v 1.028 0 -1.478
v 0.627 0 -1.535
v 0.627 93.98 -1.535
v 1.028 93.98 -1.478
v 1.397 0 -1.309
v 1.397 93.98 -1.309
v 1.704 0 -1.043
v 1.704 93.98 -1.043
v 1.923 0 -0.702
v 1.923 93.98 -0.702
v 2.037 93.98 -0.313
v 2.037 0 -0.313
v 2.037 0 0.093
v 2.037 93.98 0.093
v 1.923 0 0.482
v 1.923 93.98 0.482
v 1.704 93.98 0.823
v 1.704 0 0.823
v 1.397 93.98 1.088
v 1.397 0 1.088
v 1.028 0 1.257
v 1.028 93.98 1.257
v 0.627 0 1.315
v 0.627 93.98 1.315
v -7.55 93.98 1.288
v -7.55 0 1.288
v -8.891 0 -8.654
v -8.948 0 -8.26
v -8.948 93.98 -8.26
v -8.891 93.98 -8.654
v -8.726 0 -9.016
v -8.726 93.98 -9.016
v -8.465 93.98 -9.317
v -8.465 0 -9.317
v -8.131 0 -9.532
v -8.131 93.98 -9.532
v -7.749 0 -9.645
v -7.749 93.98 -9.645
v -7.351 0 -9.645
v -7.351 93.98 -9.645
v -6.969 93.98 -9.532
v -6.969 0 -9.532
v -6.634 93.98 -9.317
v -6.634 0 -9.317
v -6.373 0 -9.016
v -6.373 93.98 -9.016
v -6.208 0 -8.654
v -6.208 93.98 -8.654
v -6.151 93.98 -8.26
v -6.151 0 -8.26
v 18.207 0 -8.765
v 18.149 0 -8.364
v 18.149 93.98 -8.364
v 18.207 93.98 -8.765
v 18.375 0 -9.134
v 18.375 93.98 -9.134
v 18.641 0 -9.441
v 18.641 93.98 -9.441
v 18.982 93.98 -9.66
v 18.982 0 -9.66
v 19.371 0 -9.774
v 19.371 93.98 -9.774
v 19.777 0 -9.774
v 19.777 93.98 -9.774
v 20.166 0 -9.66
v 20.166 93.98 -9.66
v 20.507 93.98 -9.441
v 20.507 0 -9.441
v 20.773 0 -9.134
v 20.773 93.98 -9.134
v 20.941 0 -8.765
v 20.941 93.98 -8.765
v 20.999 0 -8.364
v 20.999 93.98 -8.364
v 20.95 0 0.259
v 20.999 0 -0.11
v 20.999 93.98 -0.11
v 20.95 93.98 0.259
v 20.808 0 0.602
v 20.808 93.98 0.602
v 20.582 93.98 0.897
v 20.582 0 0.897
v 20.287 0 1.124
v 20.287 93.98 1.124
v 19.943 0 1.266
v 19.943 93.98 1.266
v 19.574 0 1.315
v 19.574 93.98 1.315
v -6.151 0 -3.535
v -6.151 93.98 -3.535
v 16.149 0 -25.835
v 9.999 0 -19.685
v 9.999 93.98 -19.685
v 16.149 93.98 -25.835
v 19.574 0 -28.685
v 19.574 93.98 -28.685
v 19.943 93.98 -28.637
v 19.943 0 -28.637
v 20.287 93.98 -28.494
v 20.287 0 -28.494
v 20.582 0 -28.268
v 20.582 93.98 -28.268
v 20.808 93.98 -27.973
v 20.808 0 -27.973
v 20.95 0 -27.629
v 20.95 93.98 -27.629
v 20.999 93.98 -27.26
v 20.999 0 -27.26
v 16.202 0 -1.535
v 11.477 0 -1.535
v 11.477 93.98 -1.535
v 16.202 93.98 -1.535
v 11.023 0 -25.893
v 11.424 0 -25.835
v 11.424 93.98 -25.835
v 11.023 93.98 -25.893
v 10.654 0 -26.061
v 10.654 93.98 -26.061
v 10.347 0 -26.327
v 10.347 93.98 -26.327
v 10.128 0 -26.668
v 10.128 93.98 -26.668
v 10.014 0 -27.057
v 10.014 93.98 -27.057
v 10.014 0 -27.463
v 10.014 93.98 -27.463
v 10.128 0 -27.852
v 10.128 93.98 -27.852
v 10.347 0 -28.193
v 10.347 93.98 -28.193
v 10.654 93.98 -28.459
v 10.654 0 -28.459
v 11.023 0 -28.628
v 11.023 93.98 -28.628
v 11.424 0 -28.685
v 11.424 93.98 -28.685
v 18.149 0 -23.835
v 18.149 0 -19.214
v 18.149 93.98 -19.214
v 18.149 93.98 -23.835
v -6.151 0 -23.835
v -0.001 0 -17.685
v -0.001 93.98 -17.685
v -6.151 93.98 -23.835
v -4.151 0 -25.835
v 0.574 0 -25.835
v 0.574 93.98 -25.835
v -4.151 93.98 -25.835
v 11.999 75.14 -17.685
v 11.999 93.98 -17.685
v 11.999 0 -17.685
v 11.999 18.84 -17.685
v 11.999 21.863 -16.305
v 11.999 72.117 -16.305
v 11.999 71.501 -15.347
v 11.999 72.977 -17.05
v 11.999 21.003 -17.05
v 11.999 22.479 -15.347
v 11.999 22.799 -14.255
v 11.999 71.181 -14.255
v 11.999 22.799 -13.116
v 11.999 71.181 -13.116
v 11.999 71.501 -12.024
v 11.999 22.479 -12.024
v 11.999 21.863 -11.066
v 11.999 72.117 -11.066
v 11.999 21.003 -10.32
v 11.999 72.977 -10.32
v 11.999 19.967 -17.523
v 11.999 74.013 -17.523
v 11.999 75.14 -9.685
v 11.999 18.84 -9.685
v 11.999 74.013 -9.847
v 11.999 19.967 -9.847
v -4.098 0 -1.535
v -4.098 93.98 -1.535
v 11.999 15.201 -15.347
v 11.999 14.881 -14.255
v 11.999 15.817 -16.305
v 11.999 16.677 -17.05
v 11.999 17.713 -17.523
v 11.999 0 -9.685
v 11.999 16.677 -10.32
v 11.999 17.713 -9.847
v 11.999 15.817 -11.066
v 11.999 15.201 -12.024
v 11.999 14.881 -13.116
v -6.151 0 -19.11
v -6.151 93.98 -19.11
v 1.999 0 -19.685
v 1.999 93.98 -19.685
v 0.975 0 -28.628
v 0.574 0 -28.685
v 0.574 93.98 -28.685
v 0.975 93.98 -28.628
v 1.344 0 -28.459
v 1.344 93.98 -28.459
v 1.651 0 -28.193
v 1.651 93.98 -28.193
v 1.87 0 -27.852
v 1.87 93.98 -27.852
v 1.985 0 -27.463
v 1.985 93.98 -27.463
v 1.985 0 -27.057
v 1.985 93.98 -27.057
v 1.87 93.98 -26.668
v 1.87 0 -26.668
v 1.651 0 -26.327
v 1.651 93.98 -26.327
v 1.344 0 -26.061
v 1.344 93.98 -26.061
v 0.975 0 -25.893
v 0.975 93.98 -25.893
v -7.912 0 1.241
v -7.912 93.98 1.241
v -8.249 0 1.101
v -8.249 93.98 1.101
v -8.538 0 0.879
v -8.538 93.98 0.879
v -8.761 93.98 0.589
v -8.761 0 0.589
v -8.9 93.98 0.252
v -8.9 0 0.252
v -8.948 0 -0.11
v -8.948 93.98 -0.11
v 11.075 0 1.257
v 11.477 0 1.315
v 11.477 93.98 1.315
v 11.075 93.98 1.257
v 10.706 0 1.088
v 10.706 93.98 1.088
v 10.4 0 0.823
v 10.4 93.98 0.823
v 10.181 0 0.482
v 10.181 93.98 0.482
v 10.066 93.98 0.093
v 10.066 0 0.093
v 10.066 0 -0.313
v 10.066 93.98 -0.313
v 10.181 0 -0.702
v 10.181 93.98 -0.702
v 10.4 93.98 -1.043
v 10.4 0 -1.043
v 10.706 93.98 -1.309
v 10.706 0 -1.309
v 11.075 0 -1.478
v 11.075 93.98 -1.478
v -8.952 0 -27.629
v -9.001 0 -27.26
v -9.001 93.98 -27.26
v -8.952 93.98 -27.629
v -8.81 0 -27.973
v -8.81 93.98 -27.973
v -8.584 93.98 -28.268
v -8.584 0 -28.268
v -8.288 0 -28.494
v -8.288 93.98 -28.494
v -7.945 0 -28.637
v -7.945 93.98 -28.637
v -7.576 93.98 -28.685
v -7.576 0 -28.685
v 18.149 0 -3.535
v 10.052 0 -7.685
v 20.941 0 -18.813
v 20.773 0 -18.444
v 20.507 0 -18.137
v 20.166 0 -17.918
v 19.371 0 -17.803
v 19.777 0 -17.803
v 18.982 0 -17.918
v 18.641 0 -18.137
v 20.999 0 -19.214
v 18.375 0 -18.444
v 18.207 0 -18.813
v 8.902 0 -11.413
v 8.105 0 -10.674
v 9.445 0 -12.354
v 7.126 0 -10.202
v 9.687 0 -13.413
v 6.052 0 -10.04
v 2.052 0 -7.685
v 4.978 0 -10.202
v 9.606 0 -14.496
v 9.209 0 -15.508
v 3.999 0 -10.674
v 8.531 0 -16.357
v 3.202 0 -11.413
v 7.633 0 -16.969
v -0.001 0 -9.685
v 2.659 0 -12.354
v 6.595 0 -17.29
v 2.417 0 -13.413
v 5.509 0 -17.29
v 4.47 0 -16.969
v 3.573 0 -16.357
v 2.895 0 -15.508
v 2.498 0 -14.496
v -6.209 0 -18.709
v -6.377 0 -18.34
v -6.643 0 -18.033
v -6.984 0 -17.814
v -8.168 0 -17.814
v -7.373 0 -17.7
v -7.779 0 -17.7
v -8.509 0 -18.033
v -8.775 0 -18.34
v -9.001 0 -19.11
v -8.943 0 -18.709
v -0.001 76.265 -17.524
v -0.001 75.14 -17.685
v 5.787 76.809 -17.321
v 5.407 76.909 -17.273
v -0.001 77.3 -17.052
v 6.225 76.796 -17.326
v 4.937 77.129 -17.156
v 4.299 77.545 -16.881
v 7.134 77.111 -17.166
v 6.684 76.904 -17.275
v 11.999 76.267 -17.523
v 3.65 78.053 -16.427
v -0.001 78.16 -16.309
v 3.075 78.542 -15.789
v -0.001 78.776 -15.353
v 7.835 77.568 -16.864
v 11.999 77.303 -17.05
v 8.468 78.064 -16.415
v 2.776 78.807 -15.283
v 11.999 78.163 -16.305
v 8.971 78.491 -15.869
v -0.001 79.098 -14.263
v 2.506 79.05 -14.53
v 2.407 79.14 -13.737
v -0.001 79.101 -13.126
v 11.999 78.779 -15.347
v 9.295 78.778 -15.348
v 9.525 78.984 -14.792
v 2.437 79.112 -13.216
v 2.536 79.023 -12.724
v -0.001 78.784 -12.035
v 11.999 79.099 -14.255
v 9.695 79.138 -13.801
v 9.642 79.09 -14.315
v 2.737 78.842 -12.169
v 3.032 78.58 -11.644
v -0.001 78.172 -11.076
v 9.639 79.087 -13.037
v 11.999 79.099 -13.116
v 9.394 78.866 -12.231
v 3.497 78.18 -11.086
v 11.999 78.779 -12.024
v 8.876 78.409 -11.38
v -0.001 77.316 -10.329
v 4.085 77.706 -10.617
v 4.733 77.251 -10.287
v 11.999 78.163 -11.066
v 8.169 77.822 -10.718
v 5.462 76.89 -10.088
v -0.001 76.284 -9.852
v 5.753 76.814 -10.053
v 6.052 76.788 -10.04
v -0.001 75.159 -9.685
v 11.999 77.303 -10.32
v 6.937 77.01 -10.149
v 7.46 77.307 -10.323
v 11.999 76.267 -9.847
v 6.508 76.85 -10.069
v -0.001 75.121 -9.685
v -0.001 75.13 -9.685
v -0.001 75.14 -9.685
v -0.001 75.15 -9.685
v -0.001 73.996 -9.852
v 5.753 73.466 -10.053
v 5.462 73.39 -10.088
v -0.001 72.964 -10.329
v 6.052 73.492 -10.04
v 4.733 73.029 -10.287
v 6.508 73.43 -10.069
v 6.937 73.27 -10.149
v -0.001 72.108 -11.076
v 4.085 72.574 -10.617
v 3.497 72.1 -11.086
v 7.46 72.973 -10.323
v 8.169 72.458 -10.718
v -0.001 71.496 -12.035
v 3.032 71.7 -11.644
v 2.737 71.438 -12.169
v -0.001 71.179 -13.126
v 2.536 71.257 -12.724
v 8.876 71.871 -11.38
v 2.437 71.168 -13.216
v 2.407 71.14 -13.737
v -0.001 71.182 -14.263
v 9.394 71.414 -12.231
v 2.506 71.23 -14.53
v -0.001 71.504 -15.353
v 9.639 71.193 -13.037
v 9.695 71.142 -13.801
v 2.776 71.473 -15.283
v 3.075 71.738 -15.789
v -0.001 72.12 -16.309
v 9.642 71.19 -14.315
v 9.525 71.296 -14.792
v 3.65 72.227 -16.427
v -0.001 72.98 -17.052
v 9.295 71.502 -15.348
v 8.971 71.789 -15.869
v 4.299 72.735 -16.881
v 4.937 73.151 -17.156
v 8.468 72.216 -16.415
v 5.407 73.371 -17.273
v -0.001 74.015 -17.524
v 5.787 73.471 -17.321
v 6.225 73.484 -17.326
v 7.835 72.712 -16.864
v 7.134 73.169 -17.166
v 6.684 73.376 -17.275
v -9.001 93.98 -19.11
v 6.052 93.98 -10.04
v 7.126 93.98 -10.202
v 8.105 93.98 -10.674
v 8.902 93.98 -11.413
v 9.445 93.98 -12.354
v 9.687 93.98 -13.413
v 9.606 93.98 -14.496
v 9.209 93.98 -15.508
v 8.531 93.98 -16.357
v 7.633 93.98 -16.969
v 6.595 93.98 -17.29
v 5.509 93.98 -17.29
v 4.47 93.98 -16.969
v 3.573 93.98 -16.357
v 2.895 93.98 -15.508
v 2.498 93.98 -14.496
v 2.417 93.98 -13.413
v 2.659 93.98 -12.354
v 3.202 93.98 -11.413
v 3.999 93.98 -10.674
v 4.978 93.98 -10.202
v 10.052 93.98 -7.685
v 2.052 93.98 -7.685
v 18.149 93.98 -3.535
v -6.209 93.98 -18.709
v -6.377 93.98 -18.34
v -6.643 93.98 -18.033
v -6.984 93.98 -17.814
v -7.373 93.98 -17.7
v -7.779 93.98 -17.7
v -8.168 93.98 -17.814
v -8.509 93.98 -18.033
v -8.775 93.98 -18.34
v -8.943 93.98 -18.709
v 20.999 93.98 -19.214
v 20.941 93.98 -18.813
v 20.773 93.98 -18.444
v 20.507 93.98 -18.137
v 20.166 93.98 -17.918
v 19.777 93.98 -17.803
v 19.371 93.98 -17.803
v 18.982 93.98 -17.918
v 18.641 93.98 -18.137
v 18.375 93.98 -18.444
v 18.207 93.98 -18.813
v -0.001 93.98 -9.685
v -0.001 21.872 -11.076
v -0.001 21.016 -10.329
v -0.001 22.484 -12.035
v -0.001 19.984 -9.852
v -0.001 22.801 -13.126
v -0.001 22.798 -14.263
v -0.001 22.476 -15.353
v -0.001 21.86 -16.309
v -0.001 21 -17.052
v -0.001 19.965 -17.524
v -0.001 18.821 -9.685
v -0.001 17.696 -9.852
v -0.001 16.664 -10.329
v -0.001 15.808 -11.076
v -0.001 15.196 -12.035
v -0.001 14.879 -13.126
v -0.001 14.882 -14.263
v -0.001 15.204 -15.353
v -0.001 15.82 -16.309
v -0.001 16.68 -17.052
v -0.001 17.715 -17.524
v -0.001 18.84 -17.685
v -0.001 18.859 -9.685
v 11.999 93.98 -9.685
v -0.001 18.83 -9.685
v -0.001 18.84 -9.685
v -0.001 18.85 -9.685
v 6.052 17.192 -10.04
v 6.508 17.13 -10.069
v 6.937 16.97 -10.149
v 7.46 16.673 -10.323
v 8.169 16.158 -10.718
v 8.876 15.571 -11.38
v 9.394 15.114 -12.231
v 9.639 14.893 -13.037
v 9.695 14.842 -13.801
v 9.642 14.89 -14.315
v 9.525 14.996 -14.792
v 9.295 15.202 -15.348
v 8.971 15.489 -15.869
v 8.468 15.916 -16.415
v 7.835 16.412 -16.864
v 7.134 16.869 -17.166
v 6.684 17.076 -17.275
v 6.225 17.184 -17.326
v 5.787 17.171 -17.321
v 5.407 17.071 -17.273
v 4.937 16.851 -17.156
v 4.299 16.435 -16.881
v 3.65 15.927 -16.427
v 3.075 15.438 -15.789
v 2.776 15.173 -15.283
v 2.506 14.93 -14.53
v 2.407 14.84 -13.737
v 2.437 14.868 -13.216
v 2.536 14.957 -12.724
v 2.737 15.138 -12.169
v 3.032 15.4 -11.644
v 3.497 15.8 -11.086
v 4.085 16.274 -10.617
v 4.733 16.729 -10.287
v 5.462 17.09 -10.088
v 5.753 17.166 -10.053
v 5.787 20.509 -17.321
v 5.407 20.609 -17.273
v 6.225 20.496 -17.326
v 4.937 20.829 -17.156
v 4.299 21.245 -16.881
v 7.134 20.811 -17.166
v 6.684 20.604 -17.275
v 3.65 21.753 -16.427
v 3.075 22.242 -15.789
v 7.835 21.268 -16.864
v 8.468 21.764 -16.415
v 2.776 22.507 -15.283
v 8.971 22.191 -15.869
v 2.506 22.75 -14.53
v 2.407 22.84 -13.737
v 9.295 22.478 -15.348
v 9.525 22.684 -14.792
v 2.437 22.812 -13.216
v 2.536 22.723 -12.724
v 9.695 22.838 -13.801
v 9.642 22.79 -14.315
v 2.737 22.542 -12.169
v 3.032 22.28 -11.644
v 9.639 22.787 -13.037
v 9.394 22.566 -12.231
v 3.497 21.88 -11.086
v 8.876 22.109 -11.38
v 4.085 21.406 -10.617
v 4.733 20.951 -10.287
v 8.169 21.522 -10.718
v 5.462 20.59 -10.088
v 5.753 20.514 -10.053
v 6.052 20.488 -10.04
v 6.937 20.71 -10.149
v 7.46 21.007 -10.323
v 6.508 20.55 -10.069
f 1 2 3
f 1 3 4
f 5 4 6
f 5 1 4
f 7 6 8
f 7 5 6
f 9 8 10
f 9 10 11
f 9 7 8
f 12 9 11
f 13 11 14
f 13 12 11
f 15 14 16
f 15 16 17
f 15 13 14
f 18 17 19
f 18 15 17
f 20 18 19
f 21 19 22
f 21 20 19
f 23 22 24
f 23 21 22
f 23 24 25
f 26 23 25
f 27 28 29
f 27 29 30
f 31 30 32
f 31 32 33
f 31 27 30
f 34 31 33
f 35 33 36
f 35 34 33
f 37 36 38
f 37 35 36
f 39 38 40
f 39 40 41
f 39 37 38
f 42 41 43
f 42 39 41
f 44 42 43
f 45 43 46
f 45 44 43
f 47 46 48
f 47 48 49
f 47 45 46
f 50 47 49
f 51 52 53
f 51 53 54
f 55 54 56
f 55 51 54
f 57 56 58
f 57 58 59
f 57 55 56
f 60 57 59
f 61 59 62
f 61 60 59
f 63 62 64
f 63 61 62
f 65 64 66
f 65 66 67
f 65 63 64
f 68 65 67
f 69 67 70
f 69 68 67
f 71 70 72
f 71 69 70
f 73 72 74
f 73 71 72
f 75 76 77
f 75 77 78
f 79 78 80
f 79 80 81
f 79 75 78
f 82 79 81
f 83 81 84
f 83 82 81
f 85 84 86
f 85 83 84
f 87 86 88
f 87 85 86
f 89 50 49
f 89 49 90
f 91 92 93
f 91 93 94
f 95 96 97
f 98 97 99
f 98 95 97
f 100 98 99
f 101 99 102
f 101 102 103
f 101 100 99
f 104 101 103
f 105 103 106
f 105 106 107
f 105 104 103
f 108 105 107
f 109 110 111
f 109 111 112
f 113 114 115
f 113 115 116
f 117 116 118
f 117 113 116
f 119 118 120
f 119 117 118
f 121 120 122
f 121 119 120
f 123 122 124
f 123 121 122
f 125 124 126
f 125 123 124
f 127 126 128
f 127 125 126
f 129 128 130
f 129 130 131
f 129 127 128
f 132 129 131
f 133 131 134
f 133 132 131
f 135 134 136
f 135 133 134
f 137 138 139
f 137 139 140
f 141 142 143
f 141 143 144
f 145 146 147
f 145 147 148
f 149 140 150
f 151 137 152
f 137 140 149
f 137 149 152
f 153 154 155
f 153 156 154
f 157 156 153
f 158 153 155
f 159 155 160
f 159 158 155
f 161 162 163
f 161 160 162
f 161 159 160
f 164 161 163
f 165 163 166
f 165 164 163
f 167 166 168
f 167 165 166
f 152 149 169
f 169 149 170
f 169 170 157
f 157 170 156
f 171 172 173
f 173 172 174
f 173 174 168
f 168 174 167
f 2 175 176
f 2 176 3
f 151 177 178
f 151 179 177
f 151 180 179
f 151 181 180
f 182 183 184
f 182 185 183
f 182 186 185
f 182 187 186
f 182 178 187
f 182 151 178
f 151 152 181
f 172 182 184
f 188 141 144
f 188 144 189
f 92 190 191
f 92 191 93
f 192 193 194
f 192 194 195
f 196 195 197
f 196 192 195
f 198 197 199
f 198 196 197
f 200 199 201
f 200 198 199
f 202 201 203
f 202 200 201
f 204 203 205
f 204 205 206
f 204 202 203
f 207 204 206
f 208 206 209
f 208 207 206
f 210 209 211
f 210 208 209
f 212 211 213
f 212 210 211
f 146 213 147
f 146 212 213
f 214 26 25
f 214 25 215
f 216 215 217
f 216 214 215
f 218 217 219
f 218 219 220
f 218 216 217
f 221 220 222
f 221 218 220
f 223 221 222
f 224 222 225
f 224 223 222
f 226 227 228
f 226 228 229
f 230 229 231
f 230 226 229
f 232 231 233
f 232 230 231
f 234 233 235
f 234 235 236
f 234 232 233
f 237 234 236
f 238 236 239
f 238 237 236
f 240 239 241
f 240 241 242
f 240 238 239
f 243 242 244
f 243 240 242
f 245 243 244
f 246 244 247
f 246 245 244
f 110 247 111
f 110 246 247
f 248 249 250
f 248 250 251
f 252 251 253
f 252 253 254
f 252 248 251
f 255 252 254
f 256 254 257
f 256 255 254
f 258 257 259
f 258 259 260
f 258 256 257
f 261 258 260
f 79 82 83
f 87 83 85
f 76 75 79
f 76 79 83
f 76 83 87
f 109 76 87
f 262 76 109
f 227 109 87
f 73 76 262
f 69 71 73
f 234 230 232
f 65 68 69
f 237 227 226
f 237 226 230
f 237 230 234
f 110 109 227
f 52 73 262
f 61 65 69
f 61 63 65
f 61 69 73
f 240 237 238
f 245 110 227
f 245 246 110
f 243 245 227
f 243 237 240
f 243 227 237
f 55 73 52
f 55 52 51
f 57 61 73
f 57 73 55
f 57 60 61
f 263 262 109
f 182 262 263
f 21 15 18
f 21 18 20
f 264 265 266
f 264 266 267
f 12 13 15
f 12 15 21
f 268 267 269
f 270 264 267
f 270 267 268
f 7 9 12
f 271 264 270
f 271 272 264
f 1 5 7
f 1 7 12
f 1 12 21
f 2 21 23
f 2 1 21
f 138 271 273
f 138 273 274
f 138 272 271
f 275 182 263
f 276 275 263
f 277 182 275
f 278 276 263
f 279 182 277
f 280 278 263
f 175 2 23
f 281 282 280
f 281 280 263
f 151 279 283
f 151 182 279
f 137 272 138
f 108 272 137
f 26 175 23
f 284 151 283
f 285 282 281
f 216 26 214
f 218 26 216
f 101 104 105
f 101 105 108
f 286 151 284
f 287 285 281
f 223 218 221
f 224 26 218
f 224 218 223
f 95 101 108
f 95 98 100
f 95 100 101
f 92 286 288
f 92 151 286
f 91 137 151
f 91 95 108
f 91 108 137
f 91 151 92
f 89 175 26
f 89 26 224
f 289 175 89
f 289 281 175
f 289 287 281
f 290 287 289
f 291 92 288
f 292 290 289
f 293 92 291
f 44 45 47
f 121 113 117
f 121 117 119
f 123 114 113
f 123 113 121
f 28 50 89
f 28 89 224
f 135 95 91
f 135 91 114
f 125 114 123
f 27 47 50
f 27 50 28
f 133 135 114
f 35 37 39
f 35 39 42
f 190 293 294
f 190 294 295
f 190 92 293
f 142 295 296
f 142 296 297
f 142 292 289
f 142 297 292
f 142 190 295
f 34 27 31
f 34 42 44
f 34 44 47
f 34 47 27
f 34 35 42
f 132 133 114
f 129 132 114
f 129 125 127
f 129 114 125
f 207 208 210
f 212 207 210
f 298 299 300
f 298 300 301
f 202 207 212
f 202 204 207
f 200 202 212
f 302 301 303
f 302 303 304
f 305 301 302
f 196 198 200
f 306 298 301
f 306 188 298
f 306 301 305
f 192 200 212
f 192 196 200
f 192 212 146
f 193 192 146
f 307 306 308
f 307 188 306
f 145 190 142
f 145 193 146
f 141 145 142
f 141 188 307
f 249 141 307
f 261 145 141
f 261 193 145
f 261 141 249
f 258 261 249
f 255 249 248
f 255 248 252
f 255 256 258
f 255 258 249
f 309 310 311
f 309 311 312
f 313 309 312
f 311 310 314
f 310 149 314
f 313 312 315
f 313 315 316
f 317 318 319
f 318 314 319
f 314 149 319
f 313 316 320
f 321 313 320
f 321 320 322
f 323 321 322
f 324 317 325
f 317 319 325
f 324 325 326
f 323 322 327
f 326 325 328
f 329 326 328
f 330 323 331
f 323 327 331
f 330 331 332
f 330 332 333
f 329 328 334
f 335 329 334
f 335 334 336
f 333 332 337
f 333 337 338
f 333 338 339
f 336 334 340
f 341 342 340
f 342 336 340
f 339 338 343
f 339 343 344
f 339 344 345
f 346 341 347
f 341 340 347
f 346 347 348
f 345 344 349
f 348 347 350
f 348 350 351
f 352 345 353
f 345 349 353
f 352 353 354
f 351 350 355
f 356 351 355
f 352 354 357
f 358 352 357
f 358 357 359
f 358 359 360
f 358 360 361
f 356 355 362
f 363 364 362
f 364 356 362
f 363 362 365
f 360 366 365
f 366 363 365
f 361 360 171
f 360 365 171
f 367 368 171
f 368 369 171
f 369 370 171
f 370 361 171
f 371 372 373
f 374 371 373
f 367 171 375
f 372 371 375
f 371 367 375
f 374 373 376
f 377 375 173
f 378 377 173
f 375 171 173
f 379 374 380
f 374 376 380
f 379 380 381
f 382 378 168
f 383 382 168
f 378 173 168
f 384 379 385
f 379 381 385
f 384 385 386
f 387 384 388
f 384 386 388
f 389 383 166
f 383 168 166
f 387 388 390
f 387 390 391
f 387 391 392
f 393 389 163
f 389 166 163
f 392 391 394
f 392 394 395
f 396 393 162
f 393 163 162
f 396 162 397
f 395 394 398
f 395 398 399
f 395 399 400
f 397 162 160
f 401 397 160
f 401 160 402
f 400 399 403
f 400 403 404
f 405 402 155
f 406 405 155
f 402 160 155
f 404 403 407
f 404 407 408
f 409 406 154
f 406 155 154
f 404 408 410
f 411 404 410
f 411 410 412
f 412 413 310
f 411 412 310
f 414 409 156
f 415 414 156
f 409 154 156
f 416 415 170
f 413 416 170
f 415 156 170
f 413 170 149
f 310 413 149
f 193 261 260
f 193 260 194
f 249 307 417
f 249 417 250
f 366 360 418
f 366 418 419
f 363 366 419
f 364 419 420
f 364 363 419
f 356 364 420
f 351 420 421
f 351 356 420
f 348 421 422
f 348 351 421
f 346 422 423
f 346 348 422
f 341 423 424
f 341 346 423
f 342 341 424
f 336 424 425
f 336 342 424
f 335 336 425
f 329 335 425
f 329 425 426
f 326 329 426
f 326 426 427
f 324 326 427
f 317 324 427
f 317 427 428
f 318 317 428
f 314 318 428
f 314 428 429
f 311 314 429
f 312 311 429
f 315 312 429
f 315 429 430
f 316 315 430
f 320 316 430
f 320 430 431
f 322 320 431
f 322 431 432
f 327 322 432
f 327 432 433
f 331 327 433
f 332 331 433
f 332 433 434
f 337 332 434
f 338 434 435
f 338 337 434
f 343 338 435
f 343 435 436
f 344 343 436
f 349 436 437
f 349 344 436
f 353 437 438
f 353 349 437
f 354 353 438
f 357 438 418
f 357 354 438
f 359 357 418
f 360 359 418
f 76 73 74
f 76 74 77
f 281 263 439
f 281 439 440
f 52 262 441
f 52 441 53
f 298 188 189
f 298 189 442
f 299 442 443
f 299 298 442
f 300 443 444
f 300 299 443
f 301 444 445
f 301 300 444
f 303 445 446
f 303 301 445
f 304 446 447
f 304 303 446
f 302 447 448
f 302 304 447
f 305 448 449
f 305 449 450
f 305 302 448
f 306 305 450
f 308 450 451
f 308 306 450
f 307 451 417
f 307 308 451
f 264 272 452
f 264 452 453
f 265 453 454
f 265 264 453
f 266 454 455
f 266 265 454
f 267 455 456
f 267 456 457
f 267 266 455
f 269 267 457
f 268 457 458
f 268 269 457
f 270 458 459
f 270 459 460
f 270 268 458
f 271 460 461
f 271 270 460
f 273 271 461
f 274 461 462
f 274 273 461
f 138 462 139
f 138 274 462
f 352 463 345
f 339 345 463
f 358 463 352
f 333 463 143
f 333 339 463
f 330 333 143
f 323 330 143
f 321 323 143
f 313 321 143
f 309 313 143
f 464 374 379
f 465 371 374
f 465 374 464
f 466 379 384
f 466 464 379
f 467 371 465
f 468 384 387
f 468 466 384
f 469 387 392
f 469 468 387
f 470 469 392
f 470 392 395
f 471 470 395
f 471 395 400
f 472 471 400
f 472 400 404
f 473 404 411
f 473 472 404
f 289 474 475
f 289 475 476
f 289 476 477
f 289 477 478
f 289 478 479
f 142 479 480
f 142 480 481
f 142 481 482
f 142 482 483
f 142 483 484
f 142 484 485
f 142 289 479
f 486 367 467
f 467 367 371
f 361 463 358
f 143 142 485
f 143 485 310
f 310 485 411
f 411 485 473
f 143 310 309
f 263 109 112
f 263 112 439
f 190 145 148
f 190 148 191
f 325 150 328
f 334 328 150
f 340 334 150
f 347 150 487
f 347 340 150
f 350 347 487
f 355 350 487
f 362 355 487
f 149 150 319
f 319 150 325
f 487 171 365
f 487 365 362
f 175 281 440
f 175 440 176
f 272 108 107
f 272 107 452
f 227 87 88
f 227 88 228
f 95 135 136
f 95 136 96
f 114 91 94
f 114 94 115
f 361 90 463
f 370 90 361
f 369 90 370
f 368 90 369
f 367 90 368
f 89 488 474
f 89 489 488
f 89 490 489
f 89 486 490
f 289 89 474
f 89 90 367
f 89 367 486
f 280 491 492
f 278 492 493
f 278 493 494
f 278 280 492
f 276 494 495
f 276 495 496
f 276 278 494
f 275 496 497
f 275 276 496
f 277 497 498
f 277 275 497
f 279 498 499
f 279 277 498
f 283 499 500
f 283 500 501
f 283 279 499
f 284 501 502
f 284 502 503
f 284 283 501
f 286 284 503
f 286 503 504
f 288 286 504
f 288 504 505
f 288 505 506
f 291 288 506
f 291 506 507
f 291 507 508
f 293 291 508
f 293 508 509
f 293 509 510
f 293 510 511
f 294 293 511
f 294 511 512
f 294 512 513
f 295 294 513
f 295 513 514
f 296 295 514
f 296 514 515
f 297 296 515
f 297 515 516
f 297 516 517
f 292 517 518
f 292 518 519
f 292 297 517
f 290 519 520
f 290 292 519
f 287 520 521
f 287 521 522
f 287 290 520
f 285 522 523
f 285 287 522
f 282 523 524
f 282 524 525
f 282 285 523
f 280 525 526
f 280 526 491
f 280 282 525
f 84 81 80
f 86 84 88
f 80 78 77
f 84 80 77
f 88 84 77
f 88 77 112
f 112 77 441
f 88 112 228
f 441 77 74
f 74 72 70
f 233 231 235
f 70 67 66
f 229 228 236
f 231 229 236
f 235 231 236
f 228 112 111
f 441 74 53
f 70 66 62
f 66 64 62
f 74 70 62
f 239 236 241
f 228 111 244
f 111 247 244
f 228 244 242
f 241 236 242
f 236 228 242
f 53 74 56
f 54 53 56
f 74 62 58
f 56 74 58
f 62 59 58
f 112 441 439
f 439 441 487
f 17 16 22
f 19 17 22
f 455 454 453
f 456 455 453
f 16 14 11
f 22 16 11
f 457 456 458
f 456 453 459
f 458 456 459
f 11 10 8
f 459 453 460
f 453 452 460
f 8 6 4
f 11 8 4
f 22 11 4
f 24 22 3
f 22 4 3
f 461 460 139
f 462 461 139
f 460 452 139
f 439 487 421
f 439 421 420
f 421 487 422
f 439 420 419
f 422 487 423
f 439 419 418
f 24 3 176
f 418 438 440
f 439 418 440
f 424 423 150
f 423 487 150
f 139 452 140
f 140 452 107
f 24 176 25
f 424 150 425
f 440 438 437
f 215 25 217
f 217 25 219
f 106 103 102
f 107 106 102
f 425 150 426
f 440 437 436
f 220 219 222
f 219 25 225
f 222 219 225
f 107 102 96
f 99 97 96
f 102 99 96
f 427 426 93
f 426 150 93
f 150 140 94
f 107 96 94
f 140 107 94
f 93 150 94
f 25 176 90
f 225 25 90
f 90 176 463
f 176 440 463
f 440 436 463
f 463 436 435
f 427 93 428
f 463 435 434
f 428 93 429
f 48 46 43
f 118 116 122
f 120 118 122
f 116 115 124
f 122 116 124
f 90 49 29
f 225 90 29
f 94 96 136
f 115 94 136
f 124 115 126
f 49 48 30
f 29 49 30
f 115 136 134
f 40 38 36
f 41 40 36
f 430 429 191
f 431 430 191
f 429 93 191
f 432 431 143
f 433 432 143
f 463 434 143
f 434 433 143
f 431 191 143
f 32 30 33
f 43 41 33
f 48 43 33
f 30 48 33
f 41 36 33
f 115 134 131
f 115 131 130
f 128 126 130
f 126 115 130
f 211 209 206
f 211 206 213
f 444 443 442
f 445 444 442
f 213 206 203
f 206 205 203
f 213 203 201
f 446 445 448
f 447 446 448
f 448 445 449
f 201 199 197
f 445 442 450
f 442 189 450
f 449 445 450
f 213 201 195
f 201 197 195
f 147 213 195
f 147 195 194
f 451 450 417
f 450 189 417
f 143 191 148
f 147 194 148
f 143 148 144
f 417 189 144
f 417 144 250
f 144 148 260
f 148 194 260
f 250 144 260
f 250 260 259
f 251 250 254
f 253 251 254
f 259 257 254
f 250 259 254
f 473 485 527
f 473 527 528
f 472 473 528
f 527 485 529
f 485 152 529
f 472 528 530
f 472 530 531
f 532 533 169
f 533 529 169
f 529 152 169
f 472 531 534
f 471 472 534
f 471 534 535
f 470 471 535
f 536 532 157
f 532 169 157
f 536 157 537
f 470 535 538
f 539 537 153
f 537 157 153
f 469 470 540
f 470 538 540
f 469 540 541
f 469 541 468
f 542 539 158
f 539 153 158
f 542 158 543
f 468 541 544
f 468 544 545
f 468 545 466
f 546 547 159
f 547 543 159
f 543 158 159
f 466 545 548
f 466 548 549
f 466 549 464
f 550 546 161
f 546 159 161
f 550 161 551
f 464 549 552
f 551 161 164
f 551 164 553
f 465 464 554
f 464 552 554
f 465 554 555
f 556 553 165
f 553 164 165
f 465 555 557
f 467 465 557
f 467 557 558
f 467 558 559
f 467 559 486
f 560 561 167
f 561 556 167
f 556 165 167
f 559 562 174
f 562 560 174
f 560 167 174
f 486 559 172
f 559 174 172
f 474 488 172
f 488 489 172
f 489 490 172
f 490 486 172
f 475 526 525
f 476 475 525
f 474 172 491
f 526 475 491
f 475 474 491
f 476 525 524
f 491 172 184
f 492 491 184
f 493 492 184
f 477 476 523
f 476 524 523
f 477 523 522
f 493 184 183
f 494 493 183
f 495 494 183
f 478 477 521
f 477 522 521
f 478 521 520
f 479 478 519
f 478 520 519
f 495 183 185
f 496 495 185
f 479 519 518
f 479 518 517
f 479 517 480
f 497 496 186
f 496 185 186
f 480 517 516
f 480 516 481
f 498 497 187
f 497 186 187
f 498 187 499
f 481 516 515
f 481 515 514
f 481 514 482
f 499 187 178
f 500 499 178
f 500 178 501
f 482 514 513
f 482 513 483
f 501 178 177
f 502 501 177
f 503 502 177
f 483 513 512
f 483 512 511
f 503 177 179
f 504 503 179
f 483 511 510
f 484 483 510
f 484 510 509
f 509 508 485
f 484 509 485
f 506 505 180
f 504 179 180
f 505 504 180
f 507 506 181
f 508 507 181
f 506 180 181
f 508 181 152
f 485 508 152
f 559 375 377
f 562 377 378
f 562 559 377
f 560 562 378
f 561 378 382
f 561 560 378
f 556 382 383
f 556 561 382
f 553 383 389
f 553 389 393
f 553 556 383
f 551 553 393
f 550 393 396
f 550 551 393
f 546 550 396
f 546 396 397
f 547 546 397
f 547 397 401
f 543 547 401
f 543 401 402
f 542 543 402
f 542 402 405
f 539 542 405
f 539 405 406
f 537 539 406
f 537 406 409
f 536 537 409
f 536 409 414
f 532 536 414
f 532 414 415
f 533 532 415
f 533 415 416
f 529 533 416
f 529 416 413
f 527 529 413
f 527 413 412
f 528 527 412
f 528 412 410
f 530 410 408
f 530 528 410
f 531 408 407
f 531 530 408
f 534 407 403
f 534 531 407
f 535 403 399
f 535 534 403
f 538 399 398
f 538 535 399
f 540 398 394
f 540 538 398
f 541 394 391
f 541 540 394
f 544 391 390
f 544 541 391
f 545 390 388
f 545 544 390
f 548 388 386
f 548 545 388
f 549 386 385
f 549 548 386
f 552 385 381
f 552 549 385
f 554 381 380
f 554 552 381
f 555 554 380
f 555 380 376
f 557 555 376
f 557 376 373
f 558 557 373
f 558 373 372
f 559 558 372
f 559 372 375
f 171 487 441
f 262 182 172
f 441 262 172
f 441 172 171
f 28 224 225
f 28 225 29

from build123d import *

# Parameters (mm, degrees)
SKETCH1_R           = 3.645
BOSS_EXTRUDE1_DEPTH = 93.98
SKETCH2_R           = 4
CUT_EXTRUDE1_DEPTH  = 93.98


with BuildPart() as part:
    # Sketch1 → Boss-Extrude1 (new body)
    with BuildSketch(Plane(origin=(0, 0, 0), x_dir=(1, 0, 0), z_dir=(0, 1, 0))):
        with BuildLine():
            Line((11.476895811, 1.535297401), (16.201895811, 1.535297401))
            Line((16.201895811, 1.535297401), (10.051895811, 7.685297401))
            Line((10.051895811, 7.685297401), (2.051895811, 7.685297401))
            Line((2.051895811, 7.685297401), (-4.098104189, 1.535297401))
            Line((-4.098104189, 1.535297401), (0.626895811, 1.535297401))
            ThreePointArc((0.626895811, 1.535297401), (2.051895811, 0.110297401), (0.626895811, -1.314702599))
            Line((0.626895811, -1.314702599), (-7.549539962, -1.288266826))
            ThreePointArc((-7.549539962, -1.288266826), (-8.538474211, -0.878636848), (-8.948104189, 0.110297401))
            Line((-8.948104189, 0.110297401), (-8.948104189, 8.260297401))
            ThreePointArc((-8.948104189, 8.260297401), (-7.549539962, 9.658861629), (-6.150975734, 8.260297401))
            Line((-6.150975734, 8.260297401), (-6.150975734, 3.535297401))
            Line((-6.150975734, 3.535297401), (-0.000975734, 9.685297401))
            Line((-0.000975734, 9.685297401), (-0.000975734, 17.685297401))
            Line((-0.000975734, 17.685297401), (-6.150975734, 23.835297401))
            Line((-6.150975734, 23.835297401), (-6.150975734, 19.110297401))
            ThreePointArc((-6.150975734, 19.110297401), (-7.575975734, 17.685297401), (-9.000975734, 19.110297401))
            Line((-9.000975734, 19.110297401), (-9.000975734, 27.260250811))
            ThreePointArc((-9.000975734, 27.260250811), (-8.583602897, 28.267877974), (-7.575975734, 28.685250811))
            Line((-7.575975734, 28.685250811), (0.574024266, 28.685250811))
            ThreePointArc((0.574024266, 28.685250811), (1.999024266, 27.260250811), (0.574024266, 25.835250811))
            Line((0.574024266, 25.835250811), (-4.150975734, 25.835250811))
            Line((-4.150975734, 25.835250811), (1.999024266, 19.685250811))
            Line((1.999024266, 19.685250811), (9.999024266, 19.685250811))
            Line((9.999024266, 19.685250811), (16.149024266, 25.835250811))
            Line((16.149024266, 25.835250811), (11.424024266, 25.835250811))
            ThreePointArc((11.424024266, 25.835250811), (9.999024266, 27.260250811), (11.424024266, 28.685250811))
            Line((11.424024266, 28.685250811), (19.574024266, 28.685250811))
            ThreePointArc((19.574024266, 28.685250811), (20.581651429, 28.267877974), (20.999024266, 27.260250811))
            Line((20.999024266, 27.260250811), (20.999024266, 19.213994497))
            ThreePointArc((20.999024266, 19.213994497), (19.574024266, 17.788994497), (18.149024266, 19.213994497))
            Line((18.149024266, 19.213994497), (18.149024266, 23.835250811))
            Line((18.149024266, 23.835250811), (11.999024266, 17.685250811))
            Line((11.999024266, 17.685250811), (11.999024266, 9.685250811))
            Line((11.999024266, 9.685250811), (18.149024266, 3.535250811))
            Line((18.149024266, 3.535250811), (18.149024266, 8.363994497))
            ThreePointArc((18.149024266, 8.363994497), (19.574024266, 9.788994497), (20.999024266, 8.363994497))
            Line((20.999024266, 8.363994497), (20.999024266, 0.110297401))
            ThreePointArc((20.999024266, 0.110297401), (20.581651429, -0.897329762), (19.574024266, -1.314702599))
            Line((19.574024266, -1.314702599), (11.476895811, -1.314702599))
            ThreePointArc((11.476895811, -1.314702599), (10.051895811, 0.110297401), (11.476895811, 1.535297401))
        make_face()
        with Locations(Location((6.051895811, 13.685297401, 0), (0, 0, 270))):
            Circle(SKETCH1_R, mode=Mode.SUBTRACT)
    extrude(amount=BOSS_EXTRUDE1_DEPTH)

    # Sketch2 → Cut-Extrude1 (cut)
    with BuildSketch(Plane(origin=(11.999024266, 0, 0), x_dir=(0, 0, -1), z_dir=(1, 0, 0))):
        with Locations((13.685250811, 75.14)):
            Circle(SKETCH2_R)
        with Locations((13.685250811, 18.84)):
            Circle(SKETCH2_R)
    extrude(amount=-CUT_EXTRUDE1_DEPTH, mode=Mode.SUBTRACT)


solid = part.part
